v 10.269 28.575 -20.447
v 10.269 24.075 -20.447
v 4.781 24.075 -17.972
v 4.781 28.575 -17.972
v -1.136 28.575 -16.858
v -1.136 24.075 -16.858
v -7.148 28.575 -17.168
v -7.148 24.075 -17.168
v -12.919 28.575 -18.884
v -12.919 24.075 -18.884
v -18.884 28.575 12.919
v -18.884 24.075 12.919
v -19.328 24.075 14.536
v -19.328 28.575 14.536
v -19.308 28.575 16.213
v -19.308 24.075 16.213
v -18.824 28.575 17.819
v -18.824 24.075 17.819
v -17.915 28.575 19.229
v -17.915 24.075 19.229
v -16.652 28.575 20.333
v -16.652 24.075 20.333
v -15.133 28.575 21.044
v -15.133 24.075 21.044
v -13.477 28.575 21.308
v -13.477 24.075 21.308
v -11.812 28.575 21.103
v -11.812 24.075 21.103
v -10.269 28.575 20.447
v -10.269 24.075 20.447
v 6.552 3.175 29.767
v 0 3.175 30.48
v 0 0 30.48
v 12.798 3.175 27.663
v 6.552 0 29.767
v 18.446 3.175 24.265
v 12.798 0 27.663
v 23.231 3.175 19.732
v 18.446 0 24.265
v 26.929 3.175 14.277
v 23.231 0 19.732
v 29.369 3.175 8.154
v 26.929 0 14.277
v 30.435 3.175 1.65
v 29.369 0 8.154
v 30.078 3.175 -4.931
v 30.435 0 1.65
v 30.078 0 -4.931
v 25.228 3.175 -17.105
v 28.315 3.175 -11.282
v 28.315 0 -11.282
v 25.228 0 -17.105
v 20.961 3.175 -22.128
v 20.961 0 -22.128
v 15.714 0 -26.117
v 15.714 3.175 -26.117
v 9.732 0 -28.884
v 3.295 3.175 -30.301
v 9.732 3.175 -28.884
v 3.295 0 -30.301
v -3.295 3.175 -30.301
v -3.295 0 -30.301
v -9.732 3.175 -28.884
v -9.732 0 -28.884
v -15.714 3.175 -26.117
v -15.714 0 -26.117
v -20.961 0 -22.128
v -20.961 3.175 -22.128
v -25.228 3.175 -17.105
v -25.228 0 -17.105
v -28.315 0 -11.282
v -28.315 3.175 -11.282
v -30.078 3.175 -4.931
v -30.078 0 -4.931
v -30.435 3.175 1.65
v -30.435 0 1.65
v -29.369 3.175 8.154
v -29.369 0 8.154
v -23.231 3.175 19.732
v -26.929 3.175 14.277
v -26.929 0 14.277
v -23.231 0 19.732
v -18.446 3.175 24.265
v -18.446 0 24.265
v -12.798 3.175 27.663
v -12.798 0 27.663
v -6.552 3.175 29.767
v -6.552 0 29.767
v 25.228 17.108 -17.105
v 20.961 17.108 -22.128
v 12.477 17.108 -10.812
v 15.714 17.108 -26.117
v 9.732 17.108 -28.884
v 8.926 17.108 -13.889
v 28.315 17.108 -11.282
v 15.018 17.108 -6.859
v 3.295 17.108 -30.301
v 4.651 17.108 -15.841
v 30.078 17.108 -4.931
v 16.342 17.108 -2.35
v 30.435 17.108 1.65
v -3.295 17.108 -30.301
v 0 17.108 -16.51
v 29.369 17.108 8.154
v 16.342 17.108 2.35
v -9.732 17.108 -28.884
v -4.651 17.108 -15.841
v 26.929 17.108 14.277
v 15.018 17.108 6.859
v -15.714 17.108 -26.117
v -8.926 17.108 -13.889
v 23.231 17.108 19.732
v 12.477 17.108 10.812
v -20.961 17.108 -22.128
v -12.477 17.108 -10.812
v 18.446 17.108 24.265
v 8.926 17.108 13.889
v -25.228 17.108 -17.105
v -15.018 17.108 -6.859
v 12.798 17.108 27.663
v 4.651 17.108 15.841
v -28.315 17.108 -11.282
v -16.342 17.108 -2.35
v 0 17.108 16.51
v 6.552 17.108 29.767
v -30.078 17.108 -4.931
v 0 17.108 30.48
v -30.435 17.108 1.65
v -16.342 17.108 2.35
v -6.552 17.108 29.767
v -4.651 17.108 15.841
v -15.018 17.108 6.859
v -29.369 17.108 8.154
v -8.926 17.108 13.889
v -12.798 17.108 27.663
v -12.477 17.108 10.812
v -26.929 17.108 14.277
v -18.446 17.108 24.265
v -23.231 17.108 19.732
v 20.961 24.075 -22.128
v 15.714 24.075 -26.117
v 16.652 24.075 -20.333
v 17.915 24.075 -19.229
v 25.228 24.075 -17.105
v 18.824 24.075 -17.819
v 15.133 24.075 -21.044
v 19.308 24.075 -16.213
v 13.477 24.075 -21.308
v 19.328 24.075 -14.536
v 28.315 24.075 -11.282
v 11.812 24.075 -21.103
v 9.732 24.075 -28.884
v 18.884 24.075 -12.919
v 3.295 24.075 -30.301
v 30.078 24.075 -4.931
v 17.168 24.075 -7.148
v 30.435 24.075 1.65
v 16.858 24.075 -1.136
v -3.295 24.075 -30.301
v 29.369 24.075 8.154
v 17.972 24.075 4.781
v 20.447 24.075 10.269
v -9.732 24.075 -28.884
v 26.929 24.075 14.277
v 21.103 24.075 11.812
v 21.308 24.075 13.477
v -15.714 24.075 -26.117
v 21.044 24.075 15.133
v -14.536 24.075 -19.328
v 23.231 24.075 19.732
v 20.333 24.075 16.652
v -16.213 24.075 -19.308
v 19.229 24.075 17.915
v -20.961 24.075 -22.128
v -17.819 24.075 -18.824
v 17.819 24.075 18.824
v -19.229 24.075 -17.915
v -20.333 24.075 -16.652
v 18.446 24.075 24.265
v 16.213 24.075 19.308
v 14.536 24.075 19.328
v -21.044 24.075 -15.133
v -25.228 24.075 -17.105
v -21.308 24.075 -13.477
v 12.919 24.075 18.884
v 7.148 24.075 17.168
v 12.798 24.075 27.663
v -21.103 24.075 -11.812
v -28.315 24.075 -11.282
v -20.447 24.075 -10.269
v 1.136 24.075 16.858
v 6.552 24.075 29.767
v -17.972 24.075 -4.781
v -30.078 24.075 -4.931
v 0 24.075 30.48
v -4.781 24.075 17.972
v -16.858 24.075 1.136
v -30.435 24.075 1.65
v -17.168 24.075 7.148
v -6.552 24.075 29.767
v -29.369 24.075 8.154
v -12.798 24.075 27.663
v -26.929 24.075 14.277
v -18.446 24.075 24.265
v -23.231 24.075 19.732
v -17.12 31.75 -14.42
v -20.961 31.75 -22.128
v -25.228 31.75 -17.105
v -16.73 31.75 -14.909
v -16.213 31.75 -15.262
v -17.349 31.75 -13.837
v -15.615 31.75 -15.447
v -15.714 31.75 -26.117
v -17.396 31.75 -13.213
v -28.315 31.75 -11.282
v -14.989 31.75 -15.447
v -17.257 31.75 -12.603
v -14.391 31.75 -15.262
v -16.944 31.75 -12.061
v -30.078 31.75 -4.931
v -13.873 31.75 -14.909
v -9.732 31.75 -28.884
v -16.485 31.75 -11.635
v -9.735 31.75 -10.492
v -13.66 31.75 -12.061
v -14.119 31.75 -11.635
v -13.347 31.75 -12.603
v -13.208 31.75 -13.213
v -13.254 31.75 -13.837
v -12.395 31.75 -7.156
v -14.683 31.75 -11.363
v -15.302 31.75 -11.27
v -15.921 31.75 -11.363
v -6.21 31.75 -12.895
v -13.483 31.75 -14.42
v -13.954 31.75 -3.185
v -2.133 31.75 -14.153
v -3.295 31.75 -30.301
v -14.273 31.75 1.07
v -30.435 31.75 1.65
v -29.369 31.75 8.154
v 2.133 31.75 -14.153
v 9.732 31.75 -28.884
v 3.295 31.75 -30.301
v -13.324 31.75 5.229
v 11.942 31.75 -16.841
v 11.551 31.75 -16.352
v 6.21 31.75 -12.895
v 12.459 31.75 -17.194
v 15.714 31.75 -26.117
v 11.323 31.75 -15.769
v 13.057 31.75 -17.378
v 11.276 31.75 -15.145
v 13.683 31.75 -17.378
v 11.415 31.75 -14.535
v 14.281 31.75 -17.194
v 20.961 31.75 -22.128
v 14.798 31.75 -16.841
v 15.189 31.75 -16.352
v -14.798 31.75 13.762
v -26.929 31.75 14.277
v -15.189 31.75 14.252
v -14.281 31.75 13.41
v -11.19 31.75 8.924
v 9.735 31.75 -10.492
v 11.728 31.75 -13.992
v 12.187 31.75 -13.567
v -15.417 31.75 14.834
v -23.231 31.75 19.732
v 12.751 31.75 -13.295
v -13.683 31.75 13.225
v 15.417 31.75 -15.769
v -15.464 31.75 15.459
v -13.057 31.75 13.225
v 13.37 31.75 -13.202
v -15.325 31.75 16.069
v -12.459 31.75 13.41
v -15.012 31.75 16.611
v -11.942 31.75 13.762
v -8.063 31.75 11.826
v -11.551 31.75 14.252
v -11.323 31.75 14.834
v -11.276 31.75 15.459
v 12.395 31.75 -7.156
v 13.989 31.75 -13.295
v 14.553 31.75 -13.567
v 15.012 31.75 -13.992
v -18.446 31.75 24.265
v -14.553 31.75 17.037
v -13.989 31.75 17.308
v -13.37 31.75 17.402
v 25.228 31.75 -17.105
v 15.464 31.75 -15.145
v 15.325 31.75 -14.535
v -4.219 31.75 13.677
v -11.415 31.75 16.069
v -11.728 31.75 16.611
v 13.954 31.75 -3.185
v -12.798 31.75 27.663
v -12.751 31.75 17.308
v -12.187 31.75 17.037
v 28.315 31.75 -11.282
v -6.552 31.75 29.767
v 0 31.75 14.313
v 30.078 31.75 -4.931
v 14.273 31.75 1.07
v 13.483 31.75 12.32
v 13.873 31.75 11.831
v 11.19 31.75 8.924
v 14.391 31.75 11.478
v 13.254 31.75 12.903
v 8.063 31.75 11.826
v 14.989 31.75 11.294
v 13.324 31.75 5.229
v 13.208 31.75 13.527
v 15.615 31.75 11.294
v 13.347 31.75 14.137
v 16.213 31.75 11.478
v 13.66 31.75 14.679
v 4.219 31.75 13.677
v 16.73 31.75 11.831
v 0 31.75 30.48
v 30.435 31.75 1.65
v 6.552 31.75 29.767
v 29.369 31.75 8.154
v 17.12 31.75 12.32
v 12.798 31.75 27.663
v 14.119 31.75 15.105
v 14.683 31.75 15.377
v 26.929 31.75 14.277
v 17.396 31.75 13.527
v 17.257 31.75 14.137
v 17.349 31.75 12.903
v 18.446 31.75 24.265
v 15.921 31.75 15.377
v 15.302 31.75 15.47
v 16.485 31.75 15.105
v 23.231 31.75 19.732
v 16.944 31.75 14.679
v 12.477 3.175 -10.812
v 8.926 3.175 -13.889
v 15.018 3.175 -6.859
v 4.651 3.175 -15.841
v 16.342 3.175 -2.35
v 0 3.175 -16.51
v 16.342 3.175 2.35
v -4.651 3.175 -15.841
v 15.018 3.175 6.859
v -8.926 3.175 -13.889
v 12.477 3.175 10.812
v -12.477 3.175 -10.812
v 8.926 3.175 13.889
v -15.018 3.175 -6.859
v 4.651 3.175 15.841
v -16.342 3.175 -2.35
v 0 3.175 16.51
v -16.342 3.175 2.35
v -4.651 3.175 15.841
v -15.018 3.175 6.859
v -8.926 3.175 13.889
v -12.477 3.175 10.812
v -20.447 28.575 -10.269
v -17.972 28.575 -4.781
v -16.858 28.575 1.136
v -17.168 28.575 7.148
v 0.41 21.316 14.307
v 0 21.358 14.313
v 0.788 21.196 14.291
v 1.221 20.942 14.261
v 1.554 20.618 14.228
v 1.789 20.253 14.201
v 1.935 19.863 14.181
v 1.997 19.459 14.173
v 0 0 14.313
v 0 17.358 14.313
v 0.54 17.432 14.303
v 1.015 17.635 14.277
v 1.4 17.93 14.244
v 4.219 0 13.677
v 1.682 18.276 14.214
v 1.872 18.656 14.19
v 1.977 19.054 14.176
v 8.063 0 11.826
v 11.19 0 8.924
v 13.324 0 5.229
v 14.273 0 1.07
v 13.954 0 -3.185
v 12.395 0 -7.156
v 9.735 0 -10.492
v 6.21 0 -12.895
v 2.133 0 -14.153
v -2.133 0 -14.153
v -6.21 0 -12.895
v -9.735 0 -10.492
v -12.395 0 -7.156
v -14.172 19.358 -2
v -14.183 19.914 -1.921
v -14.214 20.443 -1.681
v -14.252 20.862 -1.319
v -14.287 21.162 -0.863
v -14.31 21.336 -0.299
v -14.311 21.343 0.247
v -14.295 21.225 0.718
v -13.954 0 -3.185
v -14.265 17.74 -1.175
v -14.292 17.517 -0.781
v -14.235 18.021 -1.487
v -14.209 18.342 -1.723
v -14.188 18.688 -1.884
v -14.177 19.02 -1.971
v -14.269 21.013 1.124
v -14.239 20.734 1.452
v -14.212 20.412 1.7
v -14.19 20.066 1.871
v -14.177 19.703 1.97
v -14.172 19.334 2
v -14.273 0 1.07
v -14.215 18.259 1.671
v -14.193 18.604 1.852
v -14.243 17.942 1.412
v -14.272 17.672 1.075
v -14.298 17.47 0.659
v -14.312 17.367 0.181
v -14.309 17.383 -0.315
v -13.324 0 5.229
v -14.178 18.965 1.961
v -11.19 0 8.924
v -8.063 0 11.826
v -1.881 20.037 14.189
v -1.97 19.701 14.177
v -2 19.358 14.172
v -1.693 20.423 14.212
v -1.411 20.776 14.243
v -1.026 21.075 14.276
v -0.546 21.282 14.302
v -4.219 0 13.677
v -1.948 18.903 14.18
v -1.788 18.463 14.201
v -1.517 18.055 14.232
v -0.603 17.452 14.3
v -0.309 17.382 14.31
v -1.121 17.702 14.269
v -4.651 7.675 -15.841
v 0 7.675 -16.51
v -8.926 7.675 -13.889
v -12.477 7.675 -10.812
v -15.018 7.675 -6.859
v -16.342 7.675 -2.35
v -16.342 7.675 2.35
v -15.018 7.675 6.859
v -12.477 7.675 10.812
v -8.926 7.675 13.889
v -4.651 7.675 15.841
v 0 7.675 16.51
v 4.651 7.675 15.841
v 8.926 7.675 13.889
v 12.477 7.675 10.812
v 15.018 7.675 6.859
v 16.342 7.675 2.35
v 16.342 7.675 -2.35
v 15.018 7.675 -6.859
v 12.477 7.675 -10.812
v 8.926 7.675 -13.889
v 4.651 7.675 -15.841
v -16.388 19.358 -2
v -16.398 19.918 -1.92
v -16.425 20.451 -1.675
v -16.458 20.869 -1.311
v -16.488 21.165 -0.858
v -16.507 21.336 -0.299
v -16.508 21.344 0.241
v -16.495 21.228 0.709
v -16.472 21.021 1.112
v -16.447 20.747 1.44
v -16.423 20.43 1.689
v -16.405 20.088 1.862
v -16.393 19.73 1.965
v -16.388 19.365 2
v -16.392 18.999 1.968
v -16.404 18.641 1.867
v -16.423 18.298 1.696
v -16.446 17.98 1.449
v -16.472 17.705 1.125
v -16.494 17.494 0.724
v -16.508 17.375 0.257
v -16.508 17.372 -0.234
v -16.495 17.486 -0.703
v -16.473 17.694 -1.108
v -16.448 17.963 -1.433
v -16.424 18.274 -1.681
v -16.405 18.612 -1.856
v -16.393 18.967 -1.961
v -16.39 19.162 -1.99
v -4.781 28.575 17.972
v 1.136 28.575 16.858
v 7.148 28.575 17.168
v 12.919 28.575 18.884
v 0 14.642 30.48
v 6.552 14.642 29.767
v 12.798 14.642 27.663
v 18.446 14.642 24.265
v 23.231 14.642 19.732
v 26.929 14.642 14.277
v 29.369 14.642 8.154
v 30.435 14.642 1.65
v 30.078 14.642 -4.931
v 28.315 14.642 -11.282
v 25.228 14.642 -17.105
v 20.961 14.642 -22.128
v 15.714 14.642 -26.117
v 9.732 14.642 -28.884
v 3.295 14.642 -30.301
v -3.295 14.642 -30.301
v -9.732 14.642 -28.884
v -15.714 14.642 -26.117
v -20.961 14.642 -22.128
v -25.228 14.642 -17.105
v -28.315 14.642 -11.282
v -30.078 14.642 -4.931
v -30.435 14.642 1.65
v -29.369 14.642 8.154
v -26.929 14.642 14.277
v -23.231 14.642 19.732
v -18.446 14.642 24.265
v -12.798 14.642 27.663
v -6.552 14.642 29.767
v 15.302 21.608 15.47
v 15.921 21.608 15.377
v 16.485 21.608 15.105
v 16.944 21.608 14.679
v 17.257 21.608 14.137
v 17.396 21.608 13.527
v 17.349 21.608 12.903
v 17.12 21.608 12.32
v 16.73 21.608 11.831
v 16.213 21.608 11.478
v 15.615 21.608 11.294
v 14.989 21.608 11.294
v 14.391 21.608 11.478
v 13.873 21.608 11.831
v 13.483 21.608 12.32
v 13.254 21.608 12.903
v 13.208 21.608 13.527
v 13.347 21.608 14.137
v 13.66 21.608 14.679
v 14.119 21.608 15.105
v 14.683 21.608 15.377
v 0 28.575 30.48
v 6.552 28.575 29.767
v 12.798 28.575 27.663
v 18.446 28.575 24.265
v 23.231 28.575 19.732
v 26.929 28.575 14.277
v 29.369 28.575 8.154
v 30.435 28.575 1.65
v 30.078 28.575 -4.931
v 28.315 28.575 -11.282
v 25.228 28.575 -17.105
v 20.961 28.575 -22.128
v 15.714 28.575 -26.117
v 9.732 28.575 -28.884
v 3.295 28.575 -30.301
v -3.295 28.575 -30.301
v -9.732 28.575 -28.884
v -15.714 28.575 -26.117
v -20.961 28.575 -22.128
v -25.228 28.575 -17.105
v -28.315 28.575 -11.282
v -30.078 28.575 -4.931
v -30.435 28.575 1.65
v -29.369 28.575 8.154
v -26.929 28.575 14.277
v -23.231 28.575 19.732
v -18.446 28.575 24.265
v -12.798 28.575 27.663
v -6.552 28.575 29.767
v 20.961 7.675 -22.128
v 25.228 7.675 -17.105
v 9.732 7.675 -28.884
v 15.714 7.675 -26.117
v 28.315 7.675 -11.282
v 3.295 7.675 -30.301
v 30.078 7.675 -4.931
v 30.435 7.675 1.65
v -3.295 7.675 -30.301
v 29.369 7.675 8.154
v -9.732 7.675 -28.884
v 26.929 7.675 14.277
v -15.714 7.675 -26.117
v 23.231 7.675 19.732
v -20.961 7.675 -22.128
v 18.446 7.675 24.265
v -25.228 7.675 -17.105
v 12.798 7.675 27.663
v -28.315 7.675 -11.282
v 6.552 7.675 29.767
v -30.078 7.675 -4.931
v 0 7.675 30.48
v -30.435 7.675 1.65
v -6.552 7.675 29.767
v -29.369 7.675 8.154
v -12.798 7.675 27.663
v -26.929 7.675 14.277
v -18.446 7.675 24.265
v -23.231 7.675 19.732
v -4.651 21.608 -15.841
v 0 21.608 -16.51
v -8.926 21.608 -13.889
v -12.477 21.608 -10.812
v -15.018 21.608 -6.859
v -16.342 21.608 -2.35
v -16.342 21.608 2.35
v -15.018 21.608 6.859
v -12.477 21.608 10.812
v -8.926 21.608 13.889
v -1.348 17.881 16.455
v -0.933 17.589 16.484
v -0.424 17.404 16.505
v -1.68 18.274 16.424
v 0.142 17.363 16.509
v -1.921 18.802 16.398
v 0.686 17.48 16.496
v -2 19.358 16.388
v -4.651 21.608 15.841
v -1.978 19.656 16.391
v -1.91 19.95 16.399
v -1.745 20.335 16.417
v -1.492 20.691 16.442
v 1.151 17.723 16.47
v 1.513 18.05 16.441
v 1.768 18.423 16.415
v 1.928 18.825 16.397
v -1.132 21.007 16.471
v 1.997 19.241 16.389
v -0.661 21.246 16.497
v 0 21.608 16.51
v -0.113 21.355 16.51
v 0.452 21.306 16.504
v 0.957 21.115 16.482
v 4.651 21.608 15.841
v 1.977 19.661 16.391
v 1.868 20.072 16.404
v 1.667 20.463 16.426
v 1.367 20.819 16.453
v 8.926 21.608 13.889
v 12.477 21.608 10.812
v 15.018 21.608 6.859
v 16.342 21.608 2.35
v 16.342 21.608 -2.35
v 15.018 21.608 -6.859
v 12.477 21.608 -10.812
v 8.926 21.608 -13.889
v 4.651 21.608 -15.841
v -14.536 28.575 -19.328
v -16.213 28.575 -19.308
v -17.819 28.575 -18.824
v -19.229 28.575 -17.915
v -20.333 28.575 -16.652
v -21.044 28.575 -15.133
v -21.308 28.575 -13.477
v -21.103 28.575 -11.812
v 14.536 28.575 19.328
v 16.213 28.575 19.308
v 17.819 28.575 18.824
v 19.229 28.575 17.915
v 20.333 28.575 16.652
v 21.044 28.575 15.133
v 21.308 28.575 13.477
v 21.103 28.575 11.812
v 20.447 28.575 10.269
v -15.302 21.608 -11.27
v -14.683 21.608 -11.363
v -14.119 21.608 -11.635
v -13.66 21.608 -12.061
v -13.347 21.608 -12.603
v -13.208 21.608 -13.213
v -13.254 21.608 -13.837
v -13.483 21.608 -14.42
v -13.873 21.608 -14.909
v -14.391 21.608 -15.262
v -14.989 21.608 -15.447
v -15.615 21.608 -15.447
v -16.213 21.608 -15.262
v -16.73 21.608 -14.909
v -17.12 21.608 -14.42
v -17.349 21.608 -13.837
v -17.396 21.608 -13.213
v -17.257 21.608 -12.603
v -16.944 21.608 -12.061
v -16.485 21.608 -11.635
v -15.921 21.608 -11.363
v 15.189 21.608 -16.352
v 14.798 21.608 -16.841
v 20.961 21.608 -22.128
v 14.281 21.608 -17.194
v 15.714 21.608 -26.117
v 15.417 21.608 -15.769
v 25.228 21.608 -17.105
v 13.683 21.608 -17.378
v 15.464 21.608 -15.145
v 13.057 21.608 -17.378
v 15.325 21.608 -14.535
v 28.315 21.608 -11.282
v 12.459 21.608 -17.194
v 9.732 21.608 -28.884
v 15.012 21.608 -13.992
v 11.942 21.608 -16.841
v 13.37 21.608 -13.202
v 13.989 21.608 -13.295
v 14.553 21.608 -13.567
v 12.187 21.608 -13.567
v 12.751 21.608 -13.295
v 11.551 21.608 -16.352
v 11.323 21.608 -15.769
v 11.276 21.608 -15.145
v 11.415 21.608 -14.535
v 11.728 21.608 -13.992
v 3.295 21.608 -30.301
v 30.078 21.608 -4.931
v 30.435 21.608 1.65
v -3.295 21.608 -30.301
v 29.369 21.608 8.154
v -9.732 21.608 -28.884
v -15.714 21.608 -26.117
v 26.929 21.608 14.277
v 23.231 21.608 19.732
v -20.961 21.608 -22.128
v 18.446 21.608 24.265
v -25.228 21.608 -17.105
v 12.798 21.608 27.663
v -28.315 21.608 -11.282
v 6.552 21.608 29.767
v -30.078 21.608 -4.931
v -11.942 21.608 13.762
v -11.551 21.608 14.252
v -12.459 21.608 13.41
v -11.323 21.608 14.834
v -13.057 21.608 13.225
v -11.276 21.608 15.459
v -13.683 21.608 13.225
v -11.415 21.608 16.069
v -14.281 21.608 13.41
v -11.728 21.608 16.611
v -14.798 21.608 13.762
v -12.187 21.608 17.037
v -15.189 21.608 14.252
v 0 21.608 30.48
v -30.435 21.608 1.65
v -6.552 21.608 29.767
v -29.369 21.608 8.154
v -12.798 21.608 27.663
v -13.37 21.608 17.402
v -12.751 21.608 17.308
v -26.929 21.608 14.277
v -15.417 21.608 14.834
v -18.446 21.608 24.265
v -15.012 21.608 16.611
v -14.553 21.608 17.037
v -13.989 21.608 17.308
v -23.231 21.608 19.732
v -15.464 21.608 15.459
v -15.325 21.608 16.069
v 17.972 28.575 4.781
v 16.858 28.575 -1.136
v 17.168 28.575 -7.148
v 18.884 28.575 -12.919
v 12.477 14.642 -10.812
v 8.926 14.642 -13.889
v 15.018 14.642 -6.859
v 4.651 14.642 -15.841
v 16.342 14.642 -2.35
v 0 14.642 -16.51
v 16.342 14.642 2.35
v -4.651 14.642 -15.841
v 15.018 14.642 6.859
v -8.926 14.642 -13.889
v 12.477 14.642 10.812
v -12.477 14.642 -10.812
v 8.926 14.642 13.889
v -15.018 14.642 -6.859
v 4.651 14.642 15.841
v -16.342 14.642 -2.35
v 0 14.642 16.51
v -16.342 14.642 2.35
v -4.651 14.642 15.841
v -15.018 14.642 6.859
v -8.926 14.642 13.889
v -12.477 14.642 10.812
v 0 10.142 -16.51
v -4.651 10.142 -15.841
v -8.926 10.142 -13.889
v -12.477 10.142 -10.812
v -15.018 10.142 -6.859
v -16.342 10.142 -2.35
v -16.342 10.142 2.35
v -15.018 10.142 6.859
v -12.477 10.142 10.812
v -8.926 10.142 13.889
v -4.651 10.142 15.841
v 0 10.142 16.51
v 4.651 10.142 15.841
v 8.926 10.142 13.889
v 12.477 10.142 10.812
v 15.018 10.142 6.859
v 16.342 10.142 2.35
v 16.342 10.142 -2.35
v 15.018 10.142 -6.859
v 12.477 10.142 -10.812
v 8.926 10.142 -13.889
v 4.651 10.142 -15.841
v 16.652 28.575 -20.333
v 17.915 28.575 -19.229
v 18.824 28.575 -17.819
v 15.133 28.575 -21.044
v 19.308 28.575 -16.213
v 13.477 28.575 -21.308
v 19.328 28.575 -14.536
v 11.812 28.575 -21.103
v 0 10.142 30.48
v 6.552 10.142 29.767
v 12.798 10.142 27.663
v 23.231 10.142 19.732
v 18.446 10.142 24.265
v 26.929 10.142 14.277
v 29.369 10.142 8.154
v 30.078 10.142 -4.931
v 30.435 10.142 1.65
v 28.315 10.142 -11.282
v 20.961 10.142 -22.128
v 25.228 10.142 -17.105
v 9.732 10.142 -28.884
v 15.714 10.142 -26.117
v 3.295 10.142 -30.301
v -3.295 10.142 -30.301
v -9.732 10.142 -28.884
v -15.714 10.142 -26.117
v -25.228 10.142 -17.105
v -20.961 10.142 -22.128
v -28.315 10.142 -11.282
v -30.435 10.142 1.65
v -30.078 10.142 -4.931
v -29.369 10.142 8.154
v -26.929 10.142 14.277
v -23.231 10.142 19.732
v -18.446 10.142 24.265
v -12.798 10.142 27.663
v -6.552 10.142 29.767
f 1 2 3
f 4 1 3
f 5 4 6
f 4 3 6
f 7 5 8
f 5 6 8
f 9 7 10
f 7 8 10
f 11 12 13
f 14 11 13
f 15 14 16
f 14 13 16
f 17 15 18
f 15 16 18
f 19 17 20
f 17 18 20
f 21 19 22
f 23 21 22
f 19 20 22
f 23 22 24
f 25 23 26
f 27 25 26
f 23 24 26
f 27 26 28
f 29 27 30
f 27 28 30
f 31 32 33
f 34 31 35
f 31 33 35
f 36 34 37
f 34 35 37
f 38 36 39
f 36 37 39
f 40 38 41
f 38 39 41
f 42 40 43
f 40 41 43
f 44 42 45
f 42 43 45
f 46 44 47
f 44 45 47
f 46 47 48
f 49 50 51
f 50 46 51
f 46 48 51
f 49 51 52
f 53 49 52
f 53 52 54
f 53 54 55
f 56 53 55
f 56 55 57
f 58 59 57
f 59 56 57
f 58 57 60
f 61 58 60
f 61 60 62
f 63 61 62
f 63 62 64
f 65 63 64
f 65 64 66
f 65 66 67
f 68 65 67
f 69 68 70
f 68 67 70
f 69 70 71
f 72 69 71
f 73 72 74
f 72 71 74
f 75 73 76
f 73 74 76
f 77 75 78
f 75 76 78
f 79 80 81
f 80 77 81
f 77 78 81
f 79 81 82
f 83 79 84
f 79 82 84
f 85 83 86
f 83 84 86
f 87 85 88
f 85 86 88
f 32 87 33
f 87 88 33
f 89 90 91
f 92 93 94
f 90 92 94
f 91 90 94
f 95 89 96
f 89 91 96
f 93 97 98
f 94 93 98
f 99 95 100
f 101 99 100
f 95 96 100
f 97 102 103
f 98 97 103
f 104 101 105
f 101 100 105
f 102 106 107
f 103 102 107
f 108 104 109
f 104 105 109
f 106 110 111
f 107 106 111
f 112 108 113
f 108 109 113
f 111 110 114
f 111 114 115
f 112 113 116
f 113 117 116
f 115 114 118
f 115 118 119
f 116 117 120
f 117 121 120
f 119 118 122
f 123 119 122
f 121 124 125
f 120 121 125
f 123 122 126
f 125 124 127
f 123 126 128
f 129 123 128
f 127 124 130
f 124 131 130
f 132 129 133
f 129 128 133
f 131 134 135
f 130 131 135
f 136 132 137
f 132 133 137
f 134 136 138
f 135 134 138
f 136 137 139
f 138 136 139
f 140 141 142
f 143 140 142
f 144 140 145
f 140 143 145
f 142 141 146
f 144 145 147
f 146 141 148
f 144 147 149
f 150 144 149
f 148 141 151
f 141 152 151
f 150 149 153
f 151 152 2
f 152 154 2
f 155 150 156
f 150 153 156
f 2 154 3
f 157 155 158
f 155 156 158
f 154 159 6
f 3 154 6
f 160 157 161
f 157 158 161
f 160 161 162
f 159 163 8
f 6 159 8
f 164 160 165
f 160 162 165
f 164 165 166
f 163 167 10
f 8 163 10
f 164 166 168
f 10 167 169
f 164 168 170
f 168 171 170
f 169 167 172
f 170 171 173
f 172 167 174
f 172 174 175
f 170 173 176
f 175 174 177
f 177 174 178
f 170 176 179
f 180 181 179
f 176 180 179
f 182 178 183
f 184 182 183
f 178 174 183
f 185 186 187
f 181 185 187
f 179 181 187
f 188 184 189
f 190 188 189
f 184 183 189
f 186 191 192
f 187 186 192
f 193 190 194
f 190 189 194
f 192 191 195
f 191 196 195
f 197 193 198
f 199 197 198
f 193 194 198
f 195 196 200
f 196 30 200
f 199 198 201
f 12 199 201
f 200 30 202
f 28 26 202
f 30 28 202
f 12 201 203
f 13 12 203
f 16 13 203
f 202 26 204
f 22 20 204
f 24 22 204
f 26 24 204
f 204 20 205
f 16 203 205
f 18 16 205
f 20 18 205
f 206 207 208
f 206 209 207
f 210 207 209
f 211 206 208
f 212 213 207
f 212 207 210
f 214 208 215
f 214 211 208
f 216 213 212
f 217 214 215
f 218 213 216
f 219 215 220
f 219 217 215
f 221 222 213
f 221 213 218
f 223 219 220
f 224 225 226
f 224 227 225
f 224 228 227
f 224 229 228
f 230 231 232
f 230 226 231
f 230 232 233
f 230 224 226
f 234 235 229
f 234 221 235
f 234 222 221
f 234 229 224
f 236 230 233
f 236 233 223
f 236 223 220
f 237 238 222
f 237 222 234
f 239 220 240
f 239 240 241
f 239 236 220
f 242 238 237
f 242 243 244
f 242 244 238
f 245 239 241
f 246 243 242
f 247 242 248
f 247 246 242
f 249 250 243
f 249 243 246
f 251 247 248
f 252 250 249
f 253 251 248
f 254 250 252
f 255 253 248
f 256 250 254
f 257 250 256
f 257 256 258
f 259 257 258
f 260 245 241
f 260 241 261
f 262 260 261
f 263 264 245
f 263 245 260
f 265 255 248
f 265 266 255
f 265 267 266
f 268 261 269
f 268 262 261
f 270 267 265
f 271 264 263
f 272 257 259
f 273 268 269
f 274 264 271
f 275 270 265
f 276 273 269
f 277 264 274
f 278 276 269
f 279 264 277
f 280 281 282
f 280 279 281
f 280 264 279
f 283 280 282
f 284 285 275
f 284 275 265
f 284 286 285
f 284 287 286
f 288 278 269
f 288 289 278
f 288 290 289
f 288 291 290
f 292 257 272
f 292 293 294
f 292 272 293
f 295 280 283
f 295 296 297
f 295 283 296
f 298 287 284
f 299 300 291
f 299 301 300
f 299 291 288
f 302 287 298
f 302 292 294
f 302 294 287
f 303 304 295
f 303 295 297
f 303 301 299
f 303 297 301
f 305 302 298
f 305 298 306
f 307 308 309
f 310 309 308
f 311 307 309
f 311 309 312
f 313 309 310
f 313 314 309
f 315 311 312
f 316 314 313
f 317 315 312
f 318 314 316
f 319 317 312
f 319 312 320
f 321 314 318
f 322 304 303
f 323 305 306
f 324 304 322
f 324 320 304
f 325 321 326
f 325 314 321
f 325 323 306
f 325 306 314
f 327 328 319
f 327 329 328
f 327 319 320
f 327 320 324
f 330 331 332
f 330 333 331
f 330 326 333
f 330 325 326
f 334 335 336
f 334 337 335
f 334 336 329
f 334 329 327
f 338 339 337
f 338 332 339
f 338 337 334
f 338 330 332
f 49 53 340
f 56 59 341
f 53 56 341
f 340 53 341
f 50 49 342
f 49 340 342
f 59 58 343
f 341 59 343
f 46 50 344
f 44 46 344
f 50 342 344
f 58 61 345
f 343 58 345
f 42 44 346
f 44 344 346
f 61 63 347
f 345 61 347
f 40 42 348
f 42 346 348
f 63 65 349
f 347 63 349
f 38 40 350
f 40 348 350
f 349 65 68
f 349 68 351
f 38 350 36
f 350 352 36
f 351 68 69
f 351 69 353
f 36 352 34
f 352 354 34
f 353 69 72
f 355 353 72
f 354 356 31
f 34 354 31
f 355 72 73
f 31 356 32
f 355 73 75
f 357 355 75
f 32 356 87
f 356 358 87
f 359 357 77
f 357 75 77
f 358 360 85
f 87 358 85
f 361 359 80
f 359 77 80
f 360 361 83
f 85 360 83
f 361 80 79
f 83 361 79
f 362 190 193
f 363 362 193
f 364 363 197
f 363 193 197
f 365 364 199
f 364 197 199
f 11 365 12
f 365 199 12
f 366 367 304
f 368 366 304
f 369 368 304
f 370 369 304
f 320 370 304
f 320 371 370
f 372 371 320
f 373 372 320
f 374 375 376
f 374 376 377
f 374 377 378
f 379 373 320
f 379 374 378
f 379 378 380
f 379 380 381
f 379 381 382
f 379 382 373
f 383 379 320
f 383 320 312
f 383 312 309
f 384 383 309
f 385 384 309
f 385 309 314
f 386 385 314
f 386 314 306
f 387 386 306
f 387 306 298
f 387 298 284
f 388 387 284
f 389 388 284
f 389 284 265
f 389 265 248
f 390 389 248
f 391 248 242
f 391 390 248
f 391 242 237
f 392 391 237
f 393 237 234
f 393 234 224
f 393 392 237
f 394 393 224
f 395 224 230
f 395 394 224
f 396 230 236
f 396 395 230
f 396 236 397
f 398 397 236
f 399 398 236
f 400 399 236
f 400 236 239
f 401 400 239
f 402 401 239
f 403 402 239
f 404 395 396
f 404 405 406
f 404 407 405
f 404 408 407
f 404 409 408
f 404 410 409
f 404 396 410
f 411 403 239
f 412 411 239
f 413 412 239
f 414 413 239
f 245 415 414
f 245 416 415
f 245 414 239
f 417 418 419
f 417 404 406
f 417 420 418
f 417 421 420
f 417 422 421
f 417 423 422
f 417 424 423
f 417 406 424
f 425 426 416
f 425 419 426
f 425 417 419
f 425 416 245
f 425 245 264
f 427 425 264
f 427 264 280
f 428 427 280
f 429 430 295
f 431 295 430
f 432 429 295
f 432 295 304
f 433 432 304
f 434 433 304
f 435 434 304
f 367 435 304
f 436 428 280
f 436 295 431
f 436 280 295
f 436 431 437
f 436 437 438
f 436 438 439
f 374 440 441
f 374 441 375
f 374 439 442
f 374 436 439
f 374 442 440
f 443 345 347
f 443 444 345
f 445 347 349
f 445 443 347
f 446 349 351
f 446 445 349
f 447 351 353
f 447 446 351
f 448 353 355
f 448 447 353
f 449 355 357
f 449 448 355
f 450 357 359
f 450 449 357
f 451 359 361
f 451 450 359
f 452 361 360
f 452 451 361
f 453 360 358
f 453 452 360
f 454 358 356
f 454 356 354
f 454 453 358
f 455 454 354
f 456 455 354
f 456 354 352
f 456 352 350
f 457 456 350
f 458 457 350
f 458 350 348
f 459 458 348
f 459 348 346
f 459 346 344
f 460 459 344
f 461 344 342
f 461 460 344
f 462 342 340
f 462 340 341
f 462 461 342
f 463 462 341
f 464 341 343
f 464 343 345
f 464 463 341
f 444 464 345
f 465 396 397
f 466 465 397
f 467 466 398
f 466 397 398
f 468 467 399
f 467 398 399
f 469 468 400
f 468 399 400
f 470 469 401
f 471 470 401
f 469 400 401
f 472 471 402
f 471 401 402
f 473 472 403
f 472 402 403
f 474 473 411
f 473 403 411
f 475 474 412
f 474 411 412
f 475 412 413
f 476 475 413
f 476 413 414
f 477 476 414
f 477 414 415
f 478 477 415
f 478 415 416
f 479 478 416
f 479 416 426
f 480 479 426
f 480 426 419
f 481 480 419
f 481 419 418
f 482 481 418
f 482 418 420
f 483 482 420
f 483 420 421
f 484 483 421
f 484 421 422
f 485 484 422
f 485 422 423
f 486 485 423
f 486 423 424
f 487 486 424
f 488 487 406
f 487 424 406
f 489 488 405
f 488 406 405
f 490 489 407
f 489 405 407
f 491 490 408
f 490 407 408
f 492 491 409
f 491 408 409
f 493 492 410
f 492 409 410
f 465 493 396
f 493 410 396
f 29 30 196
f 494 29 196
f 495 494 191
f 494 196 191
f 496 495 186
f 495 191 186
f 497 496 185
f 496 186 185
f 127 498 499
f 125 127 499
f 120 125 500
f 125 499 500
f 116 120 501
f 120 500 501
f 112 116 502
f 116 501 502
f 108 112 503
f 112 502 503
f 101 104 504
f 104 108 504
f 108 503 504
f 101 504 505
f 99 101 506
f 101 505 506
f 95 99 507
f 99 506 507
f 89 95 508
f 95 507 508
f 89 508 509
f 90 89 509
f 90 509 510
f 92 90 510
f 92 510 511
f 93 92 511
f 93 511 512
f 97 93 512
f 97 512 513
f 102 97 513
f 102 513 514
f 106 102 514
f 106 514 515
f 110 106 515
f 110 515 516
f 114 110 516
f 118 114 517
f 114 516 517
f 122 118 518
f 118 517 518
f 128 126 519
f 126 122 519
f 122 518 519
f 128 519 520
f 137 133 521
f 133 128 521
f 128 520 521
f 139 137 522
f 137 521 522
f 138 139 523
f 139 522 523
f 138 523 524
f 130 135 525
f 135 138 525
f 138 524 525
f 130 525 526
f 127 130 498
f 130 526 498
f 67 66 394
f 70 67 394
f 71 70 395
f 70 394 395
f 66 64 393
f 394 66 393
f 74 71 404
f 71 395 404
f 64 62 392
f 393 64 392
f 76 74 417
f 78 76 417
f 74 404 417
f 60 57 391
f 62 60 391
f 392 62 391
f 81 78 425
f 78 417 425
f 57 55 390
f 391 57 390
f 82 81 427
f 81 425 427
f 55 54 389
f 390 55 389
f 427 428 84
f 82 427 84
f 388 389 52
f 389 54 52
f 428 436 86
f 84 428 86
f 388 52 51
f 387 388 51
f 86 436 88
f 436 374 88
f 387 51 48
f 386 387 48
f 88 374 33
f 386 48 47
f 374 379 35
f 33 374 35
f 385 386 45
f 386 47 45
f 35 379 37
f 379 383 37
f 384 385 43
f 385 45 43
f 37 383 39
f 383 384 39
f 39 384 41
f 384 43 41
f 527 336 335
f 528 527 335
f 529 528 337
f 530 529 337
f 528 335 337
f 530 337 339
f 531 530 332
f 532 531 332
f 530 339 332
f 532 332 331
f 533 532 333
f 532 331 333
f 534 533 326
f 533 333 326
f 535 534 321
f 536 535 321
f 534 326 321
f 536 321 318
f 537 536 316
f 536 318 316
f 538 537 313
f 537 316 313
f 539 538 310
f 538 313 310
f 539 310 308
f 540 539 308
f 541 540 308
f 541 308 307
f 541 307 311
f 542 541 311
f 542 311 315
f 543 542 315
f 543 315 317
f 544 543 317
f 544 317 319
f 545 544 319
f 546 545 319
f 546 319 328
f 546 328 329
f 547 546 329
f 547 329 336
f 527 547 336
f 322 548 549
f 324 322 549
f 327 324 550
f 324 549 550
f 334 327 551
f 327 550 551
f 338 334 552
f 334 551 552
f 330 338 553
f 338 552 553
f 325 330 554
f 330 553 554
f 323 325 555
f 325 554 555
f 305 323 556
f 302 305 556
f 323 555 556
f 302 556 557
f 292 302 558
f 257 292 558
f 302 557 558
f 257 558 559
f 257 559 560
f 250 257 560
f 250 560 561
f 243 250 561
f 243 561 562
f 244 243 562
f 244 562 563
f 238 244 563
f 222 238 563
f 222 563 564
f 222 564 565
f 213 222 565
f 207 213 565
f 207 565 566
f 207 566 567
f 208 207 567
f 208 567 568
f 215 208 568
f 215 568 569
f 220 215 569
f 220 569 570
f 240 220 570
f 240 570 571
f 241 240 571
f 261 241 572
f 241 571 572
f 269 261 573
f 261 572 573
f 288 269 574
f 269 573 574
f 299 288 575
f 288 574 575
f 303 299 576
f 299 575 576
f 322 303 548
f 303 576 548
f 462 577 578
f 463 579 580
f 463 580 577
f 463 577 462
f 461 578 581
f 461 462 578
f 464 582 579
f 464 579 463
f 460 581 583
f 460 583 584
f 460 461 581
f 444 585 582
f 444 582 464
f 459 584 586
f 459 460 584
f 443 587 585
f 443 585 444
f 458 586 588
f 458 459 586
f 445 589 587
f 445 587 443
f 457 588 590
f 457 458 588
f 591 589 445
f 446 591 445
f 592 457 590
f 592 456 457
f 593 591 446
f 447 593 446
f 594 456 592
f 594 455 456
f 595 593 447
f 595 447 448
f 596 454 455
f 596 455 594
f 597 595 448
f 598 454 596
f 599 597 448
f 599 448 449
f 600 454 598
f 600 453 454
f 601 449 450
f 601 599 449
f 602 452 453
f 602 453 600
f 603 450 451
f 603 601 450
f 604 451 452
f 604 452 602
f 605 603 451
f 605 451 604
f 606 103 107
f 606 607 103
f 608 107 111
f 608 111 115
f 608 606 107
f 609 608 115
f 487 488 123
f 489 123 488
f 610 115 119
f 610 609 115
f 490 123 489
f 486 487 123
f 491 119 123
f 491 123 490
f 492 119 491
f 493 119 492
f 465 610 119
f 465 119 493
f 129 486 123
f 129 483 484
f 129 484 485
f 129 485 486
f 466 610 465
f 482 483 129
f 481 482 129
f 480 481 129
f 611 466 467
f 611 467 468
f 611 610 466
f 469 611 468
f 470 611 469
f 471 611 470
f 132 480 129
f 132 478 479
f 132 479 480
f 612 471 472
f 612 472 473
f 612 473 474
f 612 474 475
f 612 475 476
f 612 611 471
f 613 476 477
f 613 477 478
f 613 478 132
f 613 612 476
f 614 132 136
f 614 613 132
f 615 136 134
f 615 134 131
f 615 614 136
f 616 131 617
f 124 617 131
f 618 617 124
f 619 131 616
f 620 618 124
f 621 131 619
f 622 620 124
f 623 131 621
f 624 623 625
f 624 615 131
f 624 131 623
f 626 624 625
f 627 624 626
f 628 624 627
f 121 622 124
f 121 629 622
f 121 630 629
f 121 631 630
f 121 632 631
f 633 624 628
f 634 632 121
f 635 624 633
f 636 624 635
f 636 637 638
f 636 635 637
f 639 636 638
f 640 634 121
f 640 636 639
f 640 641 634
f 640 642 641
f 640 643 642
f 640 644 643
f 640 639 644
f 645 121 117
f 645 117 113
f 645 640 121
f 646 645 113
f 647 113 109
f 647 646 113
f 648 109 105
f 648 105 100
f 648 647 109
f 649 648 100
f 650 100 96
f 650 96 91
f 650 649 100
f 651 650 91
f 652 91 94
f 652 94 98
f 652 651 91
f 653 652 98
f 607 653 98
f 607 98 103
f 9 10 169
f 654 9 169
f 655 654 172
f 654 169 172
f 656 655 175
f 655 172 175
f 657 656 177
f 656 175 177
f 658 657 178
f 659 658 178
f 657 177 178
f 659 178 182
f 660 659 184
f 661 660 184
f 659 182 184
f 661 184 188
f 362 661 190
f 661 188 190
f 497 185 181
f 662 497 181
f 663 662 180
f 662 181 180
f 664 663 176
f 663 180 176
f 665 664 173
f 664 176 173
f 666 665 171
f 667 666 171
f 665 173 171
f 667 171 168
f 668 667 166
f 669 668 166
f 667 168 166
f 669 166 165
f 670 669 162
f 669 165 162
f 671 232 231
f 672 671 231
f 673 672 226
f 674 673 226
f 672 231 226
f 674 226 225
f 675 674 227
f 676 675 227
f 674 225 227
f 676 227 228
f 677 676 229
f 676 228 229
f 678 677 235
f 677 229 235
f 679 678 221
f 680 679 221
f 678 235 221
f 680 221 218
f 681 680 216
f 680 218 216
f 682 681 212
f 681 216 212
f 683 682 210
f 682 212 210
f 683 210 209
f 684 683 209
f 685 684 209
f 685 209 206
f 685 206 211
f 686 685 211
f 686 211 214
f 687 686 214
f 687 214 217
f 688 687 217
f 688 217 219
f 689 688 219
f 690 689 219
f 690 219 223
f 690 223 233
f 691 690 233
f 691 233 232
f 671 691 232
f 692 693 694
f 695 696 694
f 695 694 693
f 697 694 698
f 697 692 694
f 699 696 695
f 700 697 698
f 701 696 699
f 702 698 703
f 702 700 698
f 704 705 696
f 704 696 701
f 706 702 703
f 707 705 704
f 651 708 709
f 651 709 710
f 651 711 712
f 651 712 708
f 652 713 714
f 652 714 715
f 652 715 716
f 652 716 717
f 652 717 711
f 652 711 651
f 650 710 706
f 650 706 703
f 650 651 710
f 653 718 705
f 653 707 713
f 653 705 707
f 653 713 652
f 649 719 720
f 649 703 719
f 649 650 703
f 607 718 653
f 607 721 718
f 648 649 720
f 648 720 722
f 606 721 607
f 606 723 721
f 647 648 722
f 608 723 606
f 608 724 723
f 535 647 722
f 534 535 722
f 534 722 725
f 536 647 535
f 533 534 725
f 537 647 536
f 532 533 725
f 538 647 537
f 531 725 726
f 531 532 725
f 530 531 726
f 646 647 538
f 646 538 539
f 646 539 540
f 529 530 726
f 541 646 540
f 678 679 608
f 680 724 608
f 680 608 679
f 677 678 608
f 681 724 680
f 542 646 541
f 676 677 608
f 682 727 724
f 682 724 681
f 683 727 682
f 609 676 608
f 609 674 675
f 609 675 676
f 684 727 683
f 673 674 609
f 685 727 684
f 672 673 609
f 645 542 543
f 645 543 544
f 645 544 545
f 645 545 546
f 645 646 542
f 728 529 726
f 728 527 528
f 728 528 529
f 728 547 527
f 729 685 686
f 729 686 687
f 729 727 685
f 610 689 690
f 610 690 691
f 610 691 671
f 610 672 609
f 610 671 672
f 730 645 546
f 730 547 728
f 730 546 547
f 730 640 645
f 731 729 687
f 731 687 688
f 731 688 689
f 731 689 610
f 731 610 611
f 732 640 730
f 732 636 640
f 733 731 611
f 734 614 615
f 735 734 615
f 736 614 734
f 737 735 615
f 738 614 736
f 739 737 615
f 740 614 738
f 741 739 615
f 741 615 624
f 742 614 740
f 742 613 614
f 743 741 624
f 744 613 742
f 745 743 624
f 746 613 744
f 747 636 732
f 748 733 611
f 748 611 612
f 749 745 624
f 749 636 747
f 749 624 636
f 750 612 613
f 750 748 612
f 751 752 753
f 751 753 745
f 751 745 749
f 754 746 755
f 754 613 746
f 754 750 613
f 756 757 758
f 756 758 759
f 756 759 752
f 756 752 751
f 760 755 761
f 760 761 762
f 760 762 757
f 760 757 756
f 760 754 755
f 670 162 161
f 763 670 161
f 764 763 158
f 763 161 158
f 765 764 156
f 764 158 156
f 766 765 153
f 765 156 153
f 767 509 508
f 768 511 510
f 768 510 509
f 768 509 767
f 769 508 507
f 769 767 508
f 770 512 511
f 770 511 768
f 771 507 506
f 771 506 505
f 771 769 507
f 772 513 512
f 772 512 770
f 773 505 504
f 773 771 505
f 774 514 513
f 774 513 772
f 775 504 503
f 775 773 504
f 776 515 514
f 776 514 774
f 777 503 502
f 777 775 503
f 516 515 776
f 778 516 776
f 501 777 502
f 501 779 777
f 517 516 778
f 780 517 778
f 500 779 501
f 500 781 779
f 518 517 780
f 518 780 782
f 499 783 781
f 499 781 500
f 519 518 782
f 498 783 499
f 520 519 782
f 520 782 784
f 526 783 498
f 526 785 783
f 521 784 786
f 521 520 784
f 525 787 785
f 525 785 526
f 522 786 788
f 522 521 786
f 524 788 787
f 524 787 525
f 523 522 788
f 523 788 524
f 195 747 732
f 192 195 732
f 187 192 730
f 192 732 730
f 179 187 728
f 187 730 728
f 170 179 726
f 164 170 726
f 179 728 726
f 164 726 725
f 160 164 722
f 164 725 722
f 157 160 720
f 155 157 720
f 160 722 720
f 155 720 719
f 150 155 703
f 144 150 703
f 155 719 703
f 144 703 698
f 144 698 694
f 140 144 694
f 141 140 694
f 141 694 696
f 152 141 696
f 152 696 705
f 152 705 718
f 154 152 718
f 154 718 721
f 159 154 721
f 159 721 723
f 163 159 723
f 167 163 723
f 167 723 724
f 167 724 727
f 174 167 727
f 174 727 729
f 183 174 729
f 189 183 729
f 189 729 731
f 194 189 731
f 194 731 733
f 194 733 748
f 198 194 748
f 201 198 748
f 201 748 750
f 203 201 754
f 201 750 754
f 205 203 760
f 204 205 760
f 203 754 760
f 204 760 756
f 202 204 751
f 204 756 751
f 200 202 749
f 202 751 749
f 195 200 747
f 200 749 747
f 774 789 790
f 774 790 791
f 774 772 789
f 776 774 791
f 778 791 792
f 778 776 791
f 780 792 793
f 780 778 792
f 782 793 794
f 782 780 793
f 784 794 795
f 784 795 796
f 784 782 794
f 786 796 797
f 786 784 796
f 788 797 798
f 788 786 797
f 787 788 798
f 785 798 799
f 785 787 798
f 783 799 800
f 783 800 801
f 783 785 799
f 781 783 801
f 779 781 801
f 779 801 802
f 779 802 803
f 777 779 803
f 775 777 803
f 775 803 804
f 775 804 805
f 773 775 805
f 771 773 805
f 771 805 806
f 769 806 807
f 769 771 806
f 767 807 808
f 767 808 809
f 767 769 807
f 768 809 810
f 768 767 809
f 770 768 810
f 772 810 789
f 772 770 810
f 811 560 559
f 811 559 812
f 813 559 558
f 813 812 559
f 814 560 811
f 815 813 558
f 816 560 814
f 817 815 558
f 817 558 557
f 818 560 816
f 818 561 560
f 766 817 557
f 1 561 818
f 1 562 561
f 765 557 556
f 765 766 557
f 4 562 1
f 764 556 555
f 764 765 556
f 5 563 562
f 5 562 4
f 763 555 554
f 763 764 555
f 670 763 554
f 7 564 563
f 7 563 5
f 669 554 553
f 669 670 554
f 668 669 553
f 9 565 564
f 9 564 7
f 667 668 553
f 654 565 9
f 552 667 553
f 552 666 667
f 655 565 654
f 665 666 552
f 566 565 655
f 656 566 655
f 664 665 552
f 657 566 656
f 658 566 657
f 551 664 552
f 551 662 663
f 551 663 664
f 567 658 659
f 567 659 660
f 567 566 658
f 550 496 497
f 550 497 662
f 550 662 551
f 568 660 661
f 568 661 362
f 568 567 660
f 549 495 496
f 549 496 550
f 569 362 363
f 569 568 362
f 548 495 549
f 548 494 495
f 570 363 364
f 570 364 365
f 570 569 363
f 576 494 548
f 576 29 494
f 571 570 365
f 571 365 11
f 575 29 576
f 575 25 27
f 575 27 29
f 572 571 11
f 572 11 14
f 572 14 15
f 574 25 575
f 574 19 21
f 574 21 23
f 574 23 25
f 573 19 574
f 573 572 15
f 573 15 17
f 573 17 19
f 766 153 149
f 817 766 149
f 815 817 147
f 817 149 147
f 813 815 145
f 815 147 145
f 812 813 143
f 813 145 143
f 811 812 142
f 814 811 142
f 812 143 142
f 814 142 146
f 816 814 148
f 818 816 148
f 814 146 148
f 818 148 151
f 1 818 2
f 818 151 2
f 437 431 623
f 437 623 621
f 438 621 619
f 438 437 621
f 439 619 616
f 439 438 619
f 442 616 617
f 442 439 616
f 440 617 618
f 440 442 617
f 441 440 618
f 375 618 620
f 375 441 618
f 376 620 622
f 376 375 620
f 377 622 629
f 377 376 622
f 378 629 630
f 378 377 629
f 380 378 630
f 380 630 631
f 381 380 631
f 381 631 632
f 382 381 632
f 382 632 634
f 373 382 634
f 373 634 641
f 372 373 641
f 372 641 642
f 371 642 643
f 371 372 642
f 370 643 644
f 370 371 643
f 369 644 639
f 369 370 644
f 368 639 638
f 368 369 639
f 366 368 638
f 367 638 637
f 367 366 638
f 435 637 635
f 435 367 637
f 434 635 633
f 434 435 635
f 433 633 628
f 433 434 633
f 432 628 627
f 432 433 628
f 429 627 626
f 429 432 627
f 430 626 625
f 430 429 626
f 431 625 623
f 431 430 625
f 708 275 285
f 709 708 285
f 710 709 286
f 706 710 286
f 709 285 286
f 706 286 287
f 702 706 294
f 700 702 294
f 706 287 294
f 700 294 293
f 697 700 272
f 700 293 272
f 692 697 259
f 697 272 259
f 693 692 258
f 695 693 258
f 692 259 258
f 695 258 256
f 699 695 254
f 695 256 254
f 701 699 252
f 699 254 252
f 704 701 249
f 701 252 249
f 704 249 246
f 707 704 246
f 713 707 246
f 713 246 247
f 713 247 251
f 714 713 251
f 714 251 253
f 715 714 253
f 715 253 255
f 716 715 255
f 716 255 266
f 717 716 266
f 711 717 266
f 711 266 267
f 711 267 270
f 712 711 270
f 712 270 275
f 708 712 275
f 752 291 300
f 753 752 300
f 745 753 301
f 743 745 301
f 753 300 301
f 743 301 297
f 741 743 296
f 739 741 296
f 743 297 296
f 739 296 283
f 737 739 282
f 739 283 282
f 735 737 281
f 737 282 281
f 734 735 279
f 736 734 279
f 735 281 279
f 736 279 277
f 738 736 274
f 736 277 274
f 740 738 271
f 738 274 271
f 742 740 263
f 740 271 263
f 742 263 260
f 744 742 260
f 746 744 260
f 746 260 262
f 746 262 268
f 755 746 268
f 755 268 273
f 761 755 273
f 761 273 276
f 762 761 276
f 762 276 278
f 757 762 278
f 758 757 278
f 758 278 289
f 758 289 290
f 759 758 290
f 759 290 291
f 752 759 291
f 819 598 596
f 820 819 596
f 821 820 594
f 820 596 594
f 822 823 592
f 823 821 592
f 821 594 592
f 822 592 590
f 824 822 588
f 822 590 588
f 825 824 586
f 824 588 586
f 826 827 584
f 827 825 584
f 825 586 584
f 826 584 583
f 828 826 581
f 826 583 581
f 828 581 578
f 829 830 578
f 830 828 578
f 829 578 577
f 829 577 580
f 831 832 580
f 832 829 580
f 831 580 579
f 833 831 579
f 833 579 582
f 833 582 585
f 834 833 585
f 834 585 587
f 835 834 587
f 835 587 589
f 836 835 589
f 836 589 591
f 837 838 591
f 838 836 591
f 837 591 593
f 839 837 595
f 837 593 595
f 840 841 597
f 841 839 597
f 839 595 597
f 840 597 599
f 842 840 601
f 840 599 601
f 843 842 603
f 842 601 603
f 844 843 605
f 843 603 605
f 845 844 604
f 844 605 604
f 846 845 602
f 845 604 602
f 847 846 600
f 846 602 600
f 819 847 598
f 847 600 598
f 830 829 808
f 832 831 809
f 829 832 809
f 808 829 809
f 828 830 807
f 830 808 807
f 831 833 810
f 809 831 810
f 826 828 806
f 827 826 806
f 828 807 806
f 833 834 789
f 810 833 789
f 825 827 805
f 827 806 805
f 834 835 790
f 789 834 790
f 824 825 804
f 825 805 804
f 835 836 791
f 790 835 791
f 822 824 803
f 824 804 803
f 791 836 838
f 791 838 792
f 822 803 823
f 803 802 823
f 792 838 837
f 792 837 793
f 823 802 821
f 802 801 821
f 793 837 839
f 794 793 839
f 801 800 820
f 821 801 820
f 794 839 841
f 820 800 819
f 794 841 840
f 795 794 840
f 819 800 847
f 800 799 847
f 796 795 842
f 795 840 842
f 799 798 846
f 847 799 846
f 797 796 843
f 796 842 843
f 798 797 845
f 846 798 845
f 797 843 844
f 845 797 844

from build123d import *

# Parameters (mm, degrees)
SKETCH1_R                        = 30.48
SKETCH1_R_2                      = 14.3129
BOSS_EXTRUDE1_DEPTH              = 31.75
SKETCH2_W                        = 13.97
SKETCH2_H                        = 4.5
BOSS_EXTRUDE2_START              = -7.675
BOSS_EXTRUDE2_OUTLINE_R          = 16.51
BOSS_EXTRUDE2_DEPTH              = 4.5
CUT_EXTRUDE2_REACH               = 55.536
CUT_EXTRUDE2_END_RADIUS          = 16.51
SKETCH8_R                        = 2
CUT_EXTRUDE3_REACH               = 55.536
CUT_EXTRUDE3_END_RADIUS          = 16.51
SKETCH9_R                        = 2
SKETCH10_R                       = 1
CUT_EXTRUDE4_DEPTH               = 10.141666667
TAP_DRILL_FOR_M5X0_8_TAP1_REACH  = 72.9
TAP_DRILL_FOR_M5X0_8_TAP1_BORE_R = 2.1


with BuildPart() as part:
    # Sketch1 → Boss-Extrude1 (new body)
    with BuildSketch(Plane(origin=(0, 0, 0), x_dir=(1, 0, 0), z_dir=(0, 1, 0))):
        with Locations(Location((0, 0, 0), (0, 0, 270))):
            Circle(SKETCH1_R)
        with Locations(Location((0, 0, 0), (0, 0, 270))):
            Circle(SKETCH1_R_2, mode=Mode.SUBTRACT)
    extrude(amount=BOSS_EXTRUDE1_DEPTH)

    # Sketch2 → Cut-Revolve2 (revolve, cut)
    with BuildSketch(Plane.XY, mode=Mode.PRIVATE) as cut_revolve2_sk:
        with Locations((23.495, 26.325)):
            Rectangle(SKETCH2_W, SKETCH2_H)
        with Locations((23.495, 12.391666667)):
            Rectangle(SKETCH2_W, SKETCH2_H)
        with Locations((23.495, 5.425)):
            Rectangle(SKETCH2_W, SKETCH2_H)
        with Locations((23.495, 19.358333333)):
            Rectangle(SKETCH2_W, SKETCH2_H)
    revolve(cut_revolve2_sk.sketch.rotate(Axis((0, 0, 0), (0, 1, 0)), 90), axis=Axis((0, 0, 0), (0, 1, 0)), mode=Mode.SUBTRACT)

    # Boss-Extrude2: read off the stored shape, not the designer's step
    # Boss-Extrude2 outline → Boss-Extrude2 (add)
    with BuildSketch(Plane(origin=(0, 31.75, 0), x_dir=(1, 0, 0), z_dir=(0, 1, 0)).offset(BOSS_EXTRUDE2_START)):
        with BuildLine():
            ThreePointArc((-20.446529483, 10.269067687), (-16.857865235, -1.135728529), (-18.884341927, -12.918821503))
            ThreePointArc((-18.884341927, -12.918821503), (-17.322622903, -19.825310342), (-10.269067687, -20.446529483))
            ThreePointArc((-10.269067687, -20.446529483), (1.135728529, -16.857865235), (12.918821503, -18.884341927))
            ThreePointArc((12.918821503, -18.884341927), (19.825310342, -17.322622903), (20.446529483, -10.269067687))
            ThreePointArc((20.446529483, -10.269067687), (16.857865235, 1.135728529), (18.884341927, 12.918821503))
            ThreePointArc((18.884341927, 12.918821503), (17.322622903, 19.825310342), (10.269067687, 20.446529483))
            ThreePointArc((10.269067687, 20.446529483), (-1.135728529, 16.857865235), (-12.918821503, 18.884341927))
            ThreePointArc((-12.918821503, 18.884341927), (-19.825310342, 17.322622903), (-20.446529483, 10.269067687))
        make_face()
        Circle(BOSS_EXTRUDE2_OUTLINE_R, mode=Mode.SUBTRACT)
    extrude(amount=BOSS_EXTRUDE2_DEPTH)

    # Cut-Extrude2: up to this cylinder (the profile starts inside it)
    cut_extrude2_end = Plane(origin=(0, 19.358333, 0), z_dir=(0, -1, 0)) * Cylinder(CUT_EXTRUDE2_END_RADIUS, 145.092, mode=Mode.PRIVATE)
    # Sketch8 → Cut-Extrude2 (cut, up to the surface)
    with BuildSketch(Plane.XY, mode=Mode.PRIVATE) as cut_extrude2_sk1:
        with Locations(Location((0, 19.358333333, 0), (0, 0, 180))):
            Circle(SKETCH8_R)
    cut_extrude2_tool1 = extrude(cut_extrude2_sk1.sketch, amount=CUT_EXTRUDE2_REACH, mode=Mode.PRIVATE) & cut_extrude2_end
    add(cut_extrude2_tool1.solids().sort_by_distance((0, 19.358333, 0))[0], mode=Mode.SUBTRACT)

    # Cut-Extrude3: up to this cylinder (the profile starts inside it)
    cut_extrude3_end = Plane(origin=(0, 19.358333, 0), z_dir=(0, -1, 0)) * Cylinder(CUT_EXTRUDE3_END_RADIUS, 145.092, mode=Mode.PRIVATE)
    # Sketch9 → Cut-Extrude3 (cut, up to the surface)
    with BuildSketch(Plane(origin=(0, 0, 0), x_dir=(0, 0, -1), z_dir=(1, 0, 0)), mode=Mode.PRIVATE) as cut_extrude3_sk1:
        with Locations((0, 19.358333333)):
            Circle(SKETCH9_R)
    cut_extrude3_tool1 = extrude(cut_extrude3_sk1.sketch, amount=-CUT_EXTRUDE3_REACH, mode=Mode.PRIVATE) & cut_extrude3_end
    add(cut_extrude3_tool1.solids().sort_by_distance((0, 19.358333, 0))[0], mode=Mode.SUBTRACT)

    # Sketch10 → Cut-Extrude4 (cut)
    with BuildSketch(Plane(origin=(0, 31.75, 0), x_dir=(1, 0, 0), z_dir=(0, 1, 0))):
        with Locations(Location((15.301734948, -13.370090036, 0), (0, 0, 270))):
            Circle(SKETCH10_R)
        with Locations(Location((13.370090036, 15.301734948, 0), (0, 0, 270))):
            Circle(SKETCH10_R)
        with Locations(Location((-15.301734948, 13.370090036, 0), (0, 0, 270))):
            Circle(SKETCH10_R)
        with Locations(Location((-13.370090036, -15.301734948, 0), (0, 0, 270))):
            Circle(SKETCH10_R)
    extrude(amount=-CUT_EXTRUDE4_DEPTH, mode=Mode.SUBTRACT)

    # Tap Drill for M5x0.8 Tap1 bore (on position points) → Tap Drill for M5x0.8 Tap1 (cut, up to next)
    with BuildSketch(Plane(origin=(15.301734948, 31.75, 13.370090036), x_dir=(0, 0, 1), z_dir=(0, 1, 0)), mode=Mode.PRIVATE) as tap_drill_for_m5x0_8_tap1_sk1:
        Circle(TAP_DRILL_FOR_M5X0_8_TAP1_BORE_R)
    tap_drill_for_m5x0_8_tap1_tool1 = extrude(tap_drill_for_m5x0_8_tap1_sk1.sketch, amount=-TAP_DRILL_FOR_M5X0_8_TAP1_REACH, mode=Mode.PRIVATE) & part.part
    # Tap Drill for M5x0.8 Tap1 bore (on position points) → Tap Drill for M5x0.8 Tap1 (cut, up to next)
    with BuildSketch(Plane(origin=(15.301734948, 31.75, 13.370090036), x_dir=(0, 0, 1), z_dir=(0, 1, 0)), mode=Mode.PRIVATE) as tap_drill_for_m5x0_8_tap1_sk2:
        with Locations((1.931644912, -28.671824984)):
            Circle(TAP_DRILL_FOR_M5X0_8_TAP1_BORE_R)
    tap_drill_for_m5x0_8_tap1_tool2 = extrude(tap_drill_for_m5x0_8_tap1_sk2.sketch, amount=-TAP_DRILL_FOR_M5X0_8_TAP1_REACH, mode=Mode.PRIVATE) & part.part
    # Tap Drill for M5x0.8 Tap1 bore (on position points) → Tap Drill for M5x0.8 Tap1 (cut, up to next)
    with BuildSketch(Plane(origin=(15.301734948, 31.75, 13.370090036), x_dir=(0, 0, 1), z_dir=(0, 1, 0)), mode=Mode.PRIVATE) as tap_drill_for_m5x0_8_tap1_sk3:
        with Locations((-26.740180072, -30.603469896)):
            Circle(TAP_DRILL_FOR_M5X0_8_TAP1_BORE_R)
    tap_drill_for_m5x0_8_tap1_tool3 = extrude(tap_drill_for_m5x0_8_tap1_sk3.sketch, amount=-TAP_DRILL_FOR_M5X0_8_TAP1_REACH, mode=Mode.PRIVATE) & part.part
    # Tap Drill for M5x0.8 Tap1 bore (on position points) → Tap Drill for M5x0.8 Tap1 (cut, up to next)
    with BuildSketch(Plane(origin=(15.301734948, 31.75, 13.370090036), x_dir=(0, 0, 1), z_dir=(0, 1, 0)), mode=Mode.PRIVATE) as tap_drill_for_m5x0_8_tap1_sk4:
        with Locations((-28.671824984, -1.931644912)):
            Circle(TAP_DRILL_FOR_M5X0_8_TAP1_BORE_R)
    tap_drill_for_m5x0_8_tap1_tool4 = extrude(tap_drill_for_m5x0_8_tap1_sk4.sketch, amount=-TAP_DRILL_FOR_M5X0_8_TAP1_REACH, mode=Mode.PRIVATE) & part.part
    add(tap_drill_for_m5x0_8_tap1_tool1.solids().sort_by_distance((15.301735, 31.75, 13.37009))[0], mode=Mode.SUBTRACT)
    add(tap_drill_for_m5x0_8_tap1_tool2.solids().sort_by_distance((-13.37009, 31.75, 15.301735))[0], mode=Mode.SUBTRACT)
    add(tap_drill_for_m5x0_8_tap1_tool3.solids().sort_by_distance((-15.301735, 31.75, -13.37009))[0], mode=Mode.SUBTRACT)
    add(tap_drill_for_m5x0_8_tap1_tool4.solids().sort_by_distance((13.37009, 31.75, -15.301735))[0], mode=Mode.SUBTRACT)


solid = part.part
